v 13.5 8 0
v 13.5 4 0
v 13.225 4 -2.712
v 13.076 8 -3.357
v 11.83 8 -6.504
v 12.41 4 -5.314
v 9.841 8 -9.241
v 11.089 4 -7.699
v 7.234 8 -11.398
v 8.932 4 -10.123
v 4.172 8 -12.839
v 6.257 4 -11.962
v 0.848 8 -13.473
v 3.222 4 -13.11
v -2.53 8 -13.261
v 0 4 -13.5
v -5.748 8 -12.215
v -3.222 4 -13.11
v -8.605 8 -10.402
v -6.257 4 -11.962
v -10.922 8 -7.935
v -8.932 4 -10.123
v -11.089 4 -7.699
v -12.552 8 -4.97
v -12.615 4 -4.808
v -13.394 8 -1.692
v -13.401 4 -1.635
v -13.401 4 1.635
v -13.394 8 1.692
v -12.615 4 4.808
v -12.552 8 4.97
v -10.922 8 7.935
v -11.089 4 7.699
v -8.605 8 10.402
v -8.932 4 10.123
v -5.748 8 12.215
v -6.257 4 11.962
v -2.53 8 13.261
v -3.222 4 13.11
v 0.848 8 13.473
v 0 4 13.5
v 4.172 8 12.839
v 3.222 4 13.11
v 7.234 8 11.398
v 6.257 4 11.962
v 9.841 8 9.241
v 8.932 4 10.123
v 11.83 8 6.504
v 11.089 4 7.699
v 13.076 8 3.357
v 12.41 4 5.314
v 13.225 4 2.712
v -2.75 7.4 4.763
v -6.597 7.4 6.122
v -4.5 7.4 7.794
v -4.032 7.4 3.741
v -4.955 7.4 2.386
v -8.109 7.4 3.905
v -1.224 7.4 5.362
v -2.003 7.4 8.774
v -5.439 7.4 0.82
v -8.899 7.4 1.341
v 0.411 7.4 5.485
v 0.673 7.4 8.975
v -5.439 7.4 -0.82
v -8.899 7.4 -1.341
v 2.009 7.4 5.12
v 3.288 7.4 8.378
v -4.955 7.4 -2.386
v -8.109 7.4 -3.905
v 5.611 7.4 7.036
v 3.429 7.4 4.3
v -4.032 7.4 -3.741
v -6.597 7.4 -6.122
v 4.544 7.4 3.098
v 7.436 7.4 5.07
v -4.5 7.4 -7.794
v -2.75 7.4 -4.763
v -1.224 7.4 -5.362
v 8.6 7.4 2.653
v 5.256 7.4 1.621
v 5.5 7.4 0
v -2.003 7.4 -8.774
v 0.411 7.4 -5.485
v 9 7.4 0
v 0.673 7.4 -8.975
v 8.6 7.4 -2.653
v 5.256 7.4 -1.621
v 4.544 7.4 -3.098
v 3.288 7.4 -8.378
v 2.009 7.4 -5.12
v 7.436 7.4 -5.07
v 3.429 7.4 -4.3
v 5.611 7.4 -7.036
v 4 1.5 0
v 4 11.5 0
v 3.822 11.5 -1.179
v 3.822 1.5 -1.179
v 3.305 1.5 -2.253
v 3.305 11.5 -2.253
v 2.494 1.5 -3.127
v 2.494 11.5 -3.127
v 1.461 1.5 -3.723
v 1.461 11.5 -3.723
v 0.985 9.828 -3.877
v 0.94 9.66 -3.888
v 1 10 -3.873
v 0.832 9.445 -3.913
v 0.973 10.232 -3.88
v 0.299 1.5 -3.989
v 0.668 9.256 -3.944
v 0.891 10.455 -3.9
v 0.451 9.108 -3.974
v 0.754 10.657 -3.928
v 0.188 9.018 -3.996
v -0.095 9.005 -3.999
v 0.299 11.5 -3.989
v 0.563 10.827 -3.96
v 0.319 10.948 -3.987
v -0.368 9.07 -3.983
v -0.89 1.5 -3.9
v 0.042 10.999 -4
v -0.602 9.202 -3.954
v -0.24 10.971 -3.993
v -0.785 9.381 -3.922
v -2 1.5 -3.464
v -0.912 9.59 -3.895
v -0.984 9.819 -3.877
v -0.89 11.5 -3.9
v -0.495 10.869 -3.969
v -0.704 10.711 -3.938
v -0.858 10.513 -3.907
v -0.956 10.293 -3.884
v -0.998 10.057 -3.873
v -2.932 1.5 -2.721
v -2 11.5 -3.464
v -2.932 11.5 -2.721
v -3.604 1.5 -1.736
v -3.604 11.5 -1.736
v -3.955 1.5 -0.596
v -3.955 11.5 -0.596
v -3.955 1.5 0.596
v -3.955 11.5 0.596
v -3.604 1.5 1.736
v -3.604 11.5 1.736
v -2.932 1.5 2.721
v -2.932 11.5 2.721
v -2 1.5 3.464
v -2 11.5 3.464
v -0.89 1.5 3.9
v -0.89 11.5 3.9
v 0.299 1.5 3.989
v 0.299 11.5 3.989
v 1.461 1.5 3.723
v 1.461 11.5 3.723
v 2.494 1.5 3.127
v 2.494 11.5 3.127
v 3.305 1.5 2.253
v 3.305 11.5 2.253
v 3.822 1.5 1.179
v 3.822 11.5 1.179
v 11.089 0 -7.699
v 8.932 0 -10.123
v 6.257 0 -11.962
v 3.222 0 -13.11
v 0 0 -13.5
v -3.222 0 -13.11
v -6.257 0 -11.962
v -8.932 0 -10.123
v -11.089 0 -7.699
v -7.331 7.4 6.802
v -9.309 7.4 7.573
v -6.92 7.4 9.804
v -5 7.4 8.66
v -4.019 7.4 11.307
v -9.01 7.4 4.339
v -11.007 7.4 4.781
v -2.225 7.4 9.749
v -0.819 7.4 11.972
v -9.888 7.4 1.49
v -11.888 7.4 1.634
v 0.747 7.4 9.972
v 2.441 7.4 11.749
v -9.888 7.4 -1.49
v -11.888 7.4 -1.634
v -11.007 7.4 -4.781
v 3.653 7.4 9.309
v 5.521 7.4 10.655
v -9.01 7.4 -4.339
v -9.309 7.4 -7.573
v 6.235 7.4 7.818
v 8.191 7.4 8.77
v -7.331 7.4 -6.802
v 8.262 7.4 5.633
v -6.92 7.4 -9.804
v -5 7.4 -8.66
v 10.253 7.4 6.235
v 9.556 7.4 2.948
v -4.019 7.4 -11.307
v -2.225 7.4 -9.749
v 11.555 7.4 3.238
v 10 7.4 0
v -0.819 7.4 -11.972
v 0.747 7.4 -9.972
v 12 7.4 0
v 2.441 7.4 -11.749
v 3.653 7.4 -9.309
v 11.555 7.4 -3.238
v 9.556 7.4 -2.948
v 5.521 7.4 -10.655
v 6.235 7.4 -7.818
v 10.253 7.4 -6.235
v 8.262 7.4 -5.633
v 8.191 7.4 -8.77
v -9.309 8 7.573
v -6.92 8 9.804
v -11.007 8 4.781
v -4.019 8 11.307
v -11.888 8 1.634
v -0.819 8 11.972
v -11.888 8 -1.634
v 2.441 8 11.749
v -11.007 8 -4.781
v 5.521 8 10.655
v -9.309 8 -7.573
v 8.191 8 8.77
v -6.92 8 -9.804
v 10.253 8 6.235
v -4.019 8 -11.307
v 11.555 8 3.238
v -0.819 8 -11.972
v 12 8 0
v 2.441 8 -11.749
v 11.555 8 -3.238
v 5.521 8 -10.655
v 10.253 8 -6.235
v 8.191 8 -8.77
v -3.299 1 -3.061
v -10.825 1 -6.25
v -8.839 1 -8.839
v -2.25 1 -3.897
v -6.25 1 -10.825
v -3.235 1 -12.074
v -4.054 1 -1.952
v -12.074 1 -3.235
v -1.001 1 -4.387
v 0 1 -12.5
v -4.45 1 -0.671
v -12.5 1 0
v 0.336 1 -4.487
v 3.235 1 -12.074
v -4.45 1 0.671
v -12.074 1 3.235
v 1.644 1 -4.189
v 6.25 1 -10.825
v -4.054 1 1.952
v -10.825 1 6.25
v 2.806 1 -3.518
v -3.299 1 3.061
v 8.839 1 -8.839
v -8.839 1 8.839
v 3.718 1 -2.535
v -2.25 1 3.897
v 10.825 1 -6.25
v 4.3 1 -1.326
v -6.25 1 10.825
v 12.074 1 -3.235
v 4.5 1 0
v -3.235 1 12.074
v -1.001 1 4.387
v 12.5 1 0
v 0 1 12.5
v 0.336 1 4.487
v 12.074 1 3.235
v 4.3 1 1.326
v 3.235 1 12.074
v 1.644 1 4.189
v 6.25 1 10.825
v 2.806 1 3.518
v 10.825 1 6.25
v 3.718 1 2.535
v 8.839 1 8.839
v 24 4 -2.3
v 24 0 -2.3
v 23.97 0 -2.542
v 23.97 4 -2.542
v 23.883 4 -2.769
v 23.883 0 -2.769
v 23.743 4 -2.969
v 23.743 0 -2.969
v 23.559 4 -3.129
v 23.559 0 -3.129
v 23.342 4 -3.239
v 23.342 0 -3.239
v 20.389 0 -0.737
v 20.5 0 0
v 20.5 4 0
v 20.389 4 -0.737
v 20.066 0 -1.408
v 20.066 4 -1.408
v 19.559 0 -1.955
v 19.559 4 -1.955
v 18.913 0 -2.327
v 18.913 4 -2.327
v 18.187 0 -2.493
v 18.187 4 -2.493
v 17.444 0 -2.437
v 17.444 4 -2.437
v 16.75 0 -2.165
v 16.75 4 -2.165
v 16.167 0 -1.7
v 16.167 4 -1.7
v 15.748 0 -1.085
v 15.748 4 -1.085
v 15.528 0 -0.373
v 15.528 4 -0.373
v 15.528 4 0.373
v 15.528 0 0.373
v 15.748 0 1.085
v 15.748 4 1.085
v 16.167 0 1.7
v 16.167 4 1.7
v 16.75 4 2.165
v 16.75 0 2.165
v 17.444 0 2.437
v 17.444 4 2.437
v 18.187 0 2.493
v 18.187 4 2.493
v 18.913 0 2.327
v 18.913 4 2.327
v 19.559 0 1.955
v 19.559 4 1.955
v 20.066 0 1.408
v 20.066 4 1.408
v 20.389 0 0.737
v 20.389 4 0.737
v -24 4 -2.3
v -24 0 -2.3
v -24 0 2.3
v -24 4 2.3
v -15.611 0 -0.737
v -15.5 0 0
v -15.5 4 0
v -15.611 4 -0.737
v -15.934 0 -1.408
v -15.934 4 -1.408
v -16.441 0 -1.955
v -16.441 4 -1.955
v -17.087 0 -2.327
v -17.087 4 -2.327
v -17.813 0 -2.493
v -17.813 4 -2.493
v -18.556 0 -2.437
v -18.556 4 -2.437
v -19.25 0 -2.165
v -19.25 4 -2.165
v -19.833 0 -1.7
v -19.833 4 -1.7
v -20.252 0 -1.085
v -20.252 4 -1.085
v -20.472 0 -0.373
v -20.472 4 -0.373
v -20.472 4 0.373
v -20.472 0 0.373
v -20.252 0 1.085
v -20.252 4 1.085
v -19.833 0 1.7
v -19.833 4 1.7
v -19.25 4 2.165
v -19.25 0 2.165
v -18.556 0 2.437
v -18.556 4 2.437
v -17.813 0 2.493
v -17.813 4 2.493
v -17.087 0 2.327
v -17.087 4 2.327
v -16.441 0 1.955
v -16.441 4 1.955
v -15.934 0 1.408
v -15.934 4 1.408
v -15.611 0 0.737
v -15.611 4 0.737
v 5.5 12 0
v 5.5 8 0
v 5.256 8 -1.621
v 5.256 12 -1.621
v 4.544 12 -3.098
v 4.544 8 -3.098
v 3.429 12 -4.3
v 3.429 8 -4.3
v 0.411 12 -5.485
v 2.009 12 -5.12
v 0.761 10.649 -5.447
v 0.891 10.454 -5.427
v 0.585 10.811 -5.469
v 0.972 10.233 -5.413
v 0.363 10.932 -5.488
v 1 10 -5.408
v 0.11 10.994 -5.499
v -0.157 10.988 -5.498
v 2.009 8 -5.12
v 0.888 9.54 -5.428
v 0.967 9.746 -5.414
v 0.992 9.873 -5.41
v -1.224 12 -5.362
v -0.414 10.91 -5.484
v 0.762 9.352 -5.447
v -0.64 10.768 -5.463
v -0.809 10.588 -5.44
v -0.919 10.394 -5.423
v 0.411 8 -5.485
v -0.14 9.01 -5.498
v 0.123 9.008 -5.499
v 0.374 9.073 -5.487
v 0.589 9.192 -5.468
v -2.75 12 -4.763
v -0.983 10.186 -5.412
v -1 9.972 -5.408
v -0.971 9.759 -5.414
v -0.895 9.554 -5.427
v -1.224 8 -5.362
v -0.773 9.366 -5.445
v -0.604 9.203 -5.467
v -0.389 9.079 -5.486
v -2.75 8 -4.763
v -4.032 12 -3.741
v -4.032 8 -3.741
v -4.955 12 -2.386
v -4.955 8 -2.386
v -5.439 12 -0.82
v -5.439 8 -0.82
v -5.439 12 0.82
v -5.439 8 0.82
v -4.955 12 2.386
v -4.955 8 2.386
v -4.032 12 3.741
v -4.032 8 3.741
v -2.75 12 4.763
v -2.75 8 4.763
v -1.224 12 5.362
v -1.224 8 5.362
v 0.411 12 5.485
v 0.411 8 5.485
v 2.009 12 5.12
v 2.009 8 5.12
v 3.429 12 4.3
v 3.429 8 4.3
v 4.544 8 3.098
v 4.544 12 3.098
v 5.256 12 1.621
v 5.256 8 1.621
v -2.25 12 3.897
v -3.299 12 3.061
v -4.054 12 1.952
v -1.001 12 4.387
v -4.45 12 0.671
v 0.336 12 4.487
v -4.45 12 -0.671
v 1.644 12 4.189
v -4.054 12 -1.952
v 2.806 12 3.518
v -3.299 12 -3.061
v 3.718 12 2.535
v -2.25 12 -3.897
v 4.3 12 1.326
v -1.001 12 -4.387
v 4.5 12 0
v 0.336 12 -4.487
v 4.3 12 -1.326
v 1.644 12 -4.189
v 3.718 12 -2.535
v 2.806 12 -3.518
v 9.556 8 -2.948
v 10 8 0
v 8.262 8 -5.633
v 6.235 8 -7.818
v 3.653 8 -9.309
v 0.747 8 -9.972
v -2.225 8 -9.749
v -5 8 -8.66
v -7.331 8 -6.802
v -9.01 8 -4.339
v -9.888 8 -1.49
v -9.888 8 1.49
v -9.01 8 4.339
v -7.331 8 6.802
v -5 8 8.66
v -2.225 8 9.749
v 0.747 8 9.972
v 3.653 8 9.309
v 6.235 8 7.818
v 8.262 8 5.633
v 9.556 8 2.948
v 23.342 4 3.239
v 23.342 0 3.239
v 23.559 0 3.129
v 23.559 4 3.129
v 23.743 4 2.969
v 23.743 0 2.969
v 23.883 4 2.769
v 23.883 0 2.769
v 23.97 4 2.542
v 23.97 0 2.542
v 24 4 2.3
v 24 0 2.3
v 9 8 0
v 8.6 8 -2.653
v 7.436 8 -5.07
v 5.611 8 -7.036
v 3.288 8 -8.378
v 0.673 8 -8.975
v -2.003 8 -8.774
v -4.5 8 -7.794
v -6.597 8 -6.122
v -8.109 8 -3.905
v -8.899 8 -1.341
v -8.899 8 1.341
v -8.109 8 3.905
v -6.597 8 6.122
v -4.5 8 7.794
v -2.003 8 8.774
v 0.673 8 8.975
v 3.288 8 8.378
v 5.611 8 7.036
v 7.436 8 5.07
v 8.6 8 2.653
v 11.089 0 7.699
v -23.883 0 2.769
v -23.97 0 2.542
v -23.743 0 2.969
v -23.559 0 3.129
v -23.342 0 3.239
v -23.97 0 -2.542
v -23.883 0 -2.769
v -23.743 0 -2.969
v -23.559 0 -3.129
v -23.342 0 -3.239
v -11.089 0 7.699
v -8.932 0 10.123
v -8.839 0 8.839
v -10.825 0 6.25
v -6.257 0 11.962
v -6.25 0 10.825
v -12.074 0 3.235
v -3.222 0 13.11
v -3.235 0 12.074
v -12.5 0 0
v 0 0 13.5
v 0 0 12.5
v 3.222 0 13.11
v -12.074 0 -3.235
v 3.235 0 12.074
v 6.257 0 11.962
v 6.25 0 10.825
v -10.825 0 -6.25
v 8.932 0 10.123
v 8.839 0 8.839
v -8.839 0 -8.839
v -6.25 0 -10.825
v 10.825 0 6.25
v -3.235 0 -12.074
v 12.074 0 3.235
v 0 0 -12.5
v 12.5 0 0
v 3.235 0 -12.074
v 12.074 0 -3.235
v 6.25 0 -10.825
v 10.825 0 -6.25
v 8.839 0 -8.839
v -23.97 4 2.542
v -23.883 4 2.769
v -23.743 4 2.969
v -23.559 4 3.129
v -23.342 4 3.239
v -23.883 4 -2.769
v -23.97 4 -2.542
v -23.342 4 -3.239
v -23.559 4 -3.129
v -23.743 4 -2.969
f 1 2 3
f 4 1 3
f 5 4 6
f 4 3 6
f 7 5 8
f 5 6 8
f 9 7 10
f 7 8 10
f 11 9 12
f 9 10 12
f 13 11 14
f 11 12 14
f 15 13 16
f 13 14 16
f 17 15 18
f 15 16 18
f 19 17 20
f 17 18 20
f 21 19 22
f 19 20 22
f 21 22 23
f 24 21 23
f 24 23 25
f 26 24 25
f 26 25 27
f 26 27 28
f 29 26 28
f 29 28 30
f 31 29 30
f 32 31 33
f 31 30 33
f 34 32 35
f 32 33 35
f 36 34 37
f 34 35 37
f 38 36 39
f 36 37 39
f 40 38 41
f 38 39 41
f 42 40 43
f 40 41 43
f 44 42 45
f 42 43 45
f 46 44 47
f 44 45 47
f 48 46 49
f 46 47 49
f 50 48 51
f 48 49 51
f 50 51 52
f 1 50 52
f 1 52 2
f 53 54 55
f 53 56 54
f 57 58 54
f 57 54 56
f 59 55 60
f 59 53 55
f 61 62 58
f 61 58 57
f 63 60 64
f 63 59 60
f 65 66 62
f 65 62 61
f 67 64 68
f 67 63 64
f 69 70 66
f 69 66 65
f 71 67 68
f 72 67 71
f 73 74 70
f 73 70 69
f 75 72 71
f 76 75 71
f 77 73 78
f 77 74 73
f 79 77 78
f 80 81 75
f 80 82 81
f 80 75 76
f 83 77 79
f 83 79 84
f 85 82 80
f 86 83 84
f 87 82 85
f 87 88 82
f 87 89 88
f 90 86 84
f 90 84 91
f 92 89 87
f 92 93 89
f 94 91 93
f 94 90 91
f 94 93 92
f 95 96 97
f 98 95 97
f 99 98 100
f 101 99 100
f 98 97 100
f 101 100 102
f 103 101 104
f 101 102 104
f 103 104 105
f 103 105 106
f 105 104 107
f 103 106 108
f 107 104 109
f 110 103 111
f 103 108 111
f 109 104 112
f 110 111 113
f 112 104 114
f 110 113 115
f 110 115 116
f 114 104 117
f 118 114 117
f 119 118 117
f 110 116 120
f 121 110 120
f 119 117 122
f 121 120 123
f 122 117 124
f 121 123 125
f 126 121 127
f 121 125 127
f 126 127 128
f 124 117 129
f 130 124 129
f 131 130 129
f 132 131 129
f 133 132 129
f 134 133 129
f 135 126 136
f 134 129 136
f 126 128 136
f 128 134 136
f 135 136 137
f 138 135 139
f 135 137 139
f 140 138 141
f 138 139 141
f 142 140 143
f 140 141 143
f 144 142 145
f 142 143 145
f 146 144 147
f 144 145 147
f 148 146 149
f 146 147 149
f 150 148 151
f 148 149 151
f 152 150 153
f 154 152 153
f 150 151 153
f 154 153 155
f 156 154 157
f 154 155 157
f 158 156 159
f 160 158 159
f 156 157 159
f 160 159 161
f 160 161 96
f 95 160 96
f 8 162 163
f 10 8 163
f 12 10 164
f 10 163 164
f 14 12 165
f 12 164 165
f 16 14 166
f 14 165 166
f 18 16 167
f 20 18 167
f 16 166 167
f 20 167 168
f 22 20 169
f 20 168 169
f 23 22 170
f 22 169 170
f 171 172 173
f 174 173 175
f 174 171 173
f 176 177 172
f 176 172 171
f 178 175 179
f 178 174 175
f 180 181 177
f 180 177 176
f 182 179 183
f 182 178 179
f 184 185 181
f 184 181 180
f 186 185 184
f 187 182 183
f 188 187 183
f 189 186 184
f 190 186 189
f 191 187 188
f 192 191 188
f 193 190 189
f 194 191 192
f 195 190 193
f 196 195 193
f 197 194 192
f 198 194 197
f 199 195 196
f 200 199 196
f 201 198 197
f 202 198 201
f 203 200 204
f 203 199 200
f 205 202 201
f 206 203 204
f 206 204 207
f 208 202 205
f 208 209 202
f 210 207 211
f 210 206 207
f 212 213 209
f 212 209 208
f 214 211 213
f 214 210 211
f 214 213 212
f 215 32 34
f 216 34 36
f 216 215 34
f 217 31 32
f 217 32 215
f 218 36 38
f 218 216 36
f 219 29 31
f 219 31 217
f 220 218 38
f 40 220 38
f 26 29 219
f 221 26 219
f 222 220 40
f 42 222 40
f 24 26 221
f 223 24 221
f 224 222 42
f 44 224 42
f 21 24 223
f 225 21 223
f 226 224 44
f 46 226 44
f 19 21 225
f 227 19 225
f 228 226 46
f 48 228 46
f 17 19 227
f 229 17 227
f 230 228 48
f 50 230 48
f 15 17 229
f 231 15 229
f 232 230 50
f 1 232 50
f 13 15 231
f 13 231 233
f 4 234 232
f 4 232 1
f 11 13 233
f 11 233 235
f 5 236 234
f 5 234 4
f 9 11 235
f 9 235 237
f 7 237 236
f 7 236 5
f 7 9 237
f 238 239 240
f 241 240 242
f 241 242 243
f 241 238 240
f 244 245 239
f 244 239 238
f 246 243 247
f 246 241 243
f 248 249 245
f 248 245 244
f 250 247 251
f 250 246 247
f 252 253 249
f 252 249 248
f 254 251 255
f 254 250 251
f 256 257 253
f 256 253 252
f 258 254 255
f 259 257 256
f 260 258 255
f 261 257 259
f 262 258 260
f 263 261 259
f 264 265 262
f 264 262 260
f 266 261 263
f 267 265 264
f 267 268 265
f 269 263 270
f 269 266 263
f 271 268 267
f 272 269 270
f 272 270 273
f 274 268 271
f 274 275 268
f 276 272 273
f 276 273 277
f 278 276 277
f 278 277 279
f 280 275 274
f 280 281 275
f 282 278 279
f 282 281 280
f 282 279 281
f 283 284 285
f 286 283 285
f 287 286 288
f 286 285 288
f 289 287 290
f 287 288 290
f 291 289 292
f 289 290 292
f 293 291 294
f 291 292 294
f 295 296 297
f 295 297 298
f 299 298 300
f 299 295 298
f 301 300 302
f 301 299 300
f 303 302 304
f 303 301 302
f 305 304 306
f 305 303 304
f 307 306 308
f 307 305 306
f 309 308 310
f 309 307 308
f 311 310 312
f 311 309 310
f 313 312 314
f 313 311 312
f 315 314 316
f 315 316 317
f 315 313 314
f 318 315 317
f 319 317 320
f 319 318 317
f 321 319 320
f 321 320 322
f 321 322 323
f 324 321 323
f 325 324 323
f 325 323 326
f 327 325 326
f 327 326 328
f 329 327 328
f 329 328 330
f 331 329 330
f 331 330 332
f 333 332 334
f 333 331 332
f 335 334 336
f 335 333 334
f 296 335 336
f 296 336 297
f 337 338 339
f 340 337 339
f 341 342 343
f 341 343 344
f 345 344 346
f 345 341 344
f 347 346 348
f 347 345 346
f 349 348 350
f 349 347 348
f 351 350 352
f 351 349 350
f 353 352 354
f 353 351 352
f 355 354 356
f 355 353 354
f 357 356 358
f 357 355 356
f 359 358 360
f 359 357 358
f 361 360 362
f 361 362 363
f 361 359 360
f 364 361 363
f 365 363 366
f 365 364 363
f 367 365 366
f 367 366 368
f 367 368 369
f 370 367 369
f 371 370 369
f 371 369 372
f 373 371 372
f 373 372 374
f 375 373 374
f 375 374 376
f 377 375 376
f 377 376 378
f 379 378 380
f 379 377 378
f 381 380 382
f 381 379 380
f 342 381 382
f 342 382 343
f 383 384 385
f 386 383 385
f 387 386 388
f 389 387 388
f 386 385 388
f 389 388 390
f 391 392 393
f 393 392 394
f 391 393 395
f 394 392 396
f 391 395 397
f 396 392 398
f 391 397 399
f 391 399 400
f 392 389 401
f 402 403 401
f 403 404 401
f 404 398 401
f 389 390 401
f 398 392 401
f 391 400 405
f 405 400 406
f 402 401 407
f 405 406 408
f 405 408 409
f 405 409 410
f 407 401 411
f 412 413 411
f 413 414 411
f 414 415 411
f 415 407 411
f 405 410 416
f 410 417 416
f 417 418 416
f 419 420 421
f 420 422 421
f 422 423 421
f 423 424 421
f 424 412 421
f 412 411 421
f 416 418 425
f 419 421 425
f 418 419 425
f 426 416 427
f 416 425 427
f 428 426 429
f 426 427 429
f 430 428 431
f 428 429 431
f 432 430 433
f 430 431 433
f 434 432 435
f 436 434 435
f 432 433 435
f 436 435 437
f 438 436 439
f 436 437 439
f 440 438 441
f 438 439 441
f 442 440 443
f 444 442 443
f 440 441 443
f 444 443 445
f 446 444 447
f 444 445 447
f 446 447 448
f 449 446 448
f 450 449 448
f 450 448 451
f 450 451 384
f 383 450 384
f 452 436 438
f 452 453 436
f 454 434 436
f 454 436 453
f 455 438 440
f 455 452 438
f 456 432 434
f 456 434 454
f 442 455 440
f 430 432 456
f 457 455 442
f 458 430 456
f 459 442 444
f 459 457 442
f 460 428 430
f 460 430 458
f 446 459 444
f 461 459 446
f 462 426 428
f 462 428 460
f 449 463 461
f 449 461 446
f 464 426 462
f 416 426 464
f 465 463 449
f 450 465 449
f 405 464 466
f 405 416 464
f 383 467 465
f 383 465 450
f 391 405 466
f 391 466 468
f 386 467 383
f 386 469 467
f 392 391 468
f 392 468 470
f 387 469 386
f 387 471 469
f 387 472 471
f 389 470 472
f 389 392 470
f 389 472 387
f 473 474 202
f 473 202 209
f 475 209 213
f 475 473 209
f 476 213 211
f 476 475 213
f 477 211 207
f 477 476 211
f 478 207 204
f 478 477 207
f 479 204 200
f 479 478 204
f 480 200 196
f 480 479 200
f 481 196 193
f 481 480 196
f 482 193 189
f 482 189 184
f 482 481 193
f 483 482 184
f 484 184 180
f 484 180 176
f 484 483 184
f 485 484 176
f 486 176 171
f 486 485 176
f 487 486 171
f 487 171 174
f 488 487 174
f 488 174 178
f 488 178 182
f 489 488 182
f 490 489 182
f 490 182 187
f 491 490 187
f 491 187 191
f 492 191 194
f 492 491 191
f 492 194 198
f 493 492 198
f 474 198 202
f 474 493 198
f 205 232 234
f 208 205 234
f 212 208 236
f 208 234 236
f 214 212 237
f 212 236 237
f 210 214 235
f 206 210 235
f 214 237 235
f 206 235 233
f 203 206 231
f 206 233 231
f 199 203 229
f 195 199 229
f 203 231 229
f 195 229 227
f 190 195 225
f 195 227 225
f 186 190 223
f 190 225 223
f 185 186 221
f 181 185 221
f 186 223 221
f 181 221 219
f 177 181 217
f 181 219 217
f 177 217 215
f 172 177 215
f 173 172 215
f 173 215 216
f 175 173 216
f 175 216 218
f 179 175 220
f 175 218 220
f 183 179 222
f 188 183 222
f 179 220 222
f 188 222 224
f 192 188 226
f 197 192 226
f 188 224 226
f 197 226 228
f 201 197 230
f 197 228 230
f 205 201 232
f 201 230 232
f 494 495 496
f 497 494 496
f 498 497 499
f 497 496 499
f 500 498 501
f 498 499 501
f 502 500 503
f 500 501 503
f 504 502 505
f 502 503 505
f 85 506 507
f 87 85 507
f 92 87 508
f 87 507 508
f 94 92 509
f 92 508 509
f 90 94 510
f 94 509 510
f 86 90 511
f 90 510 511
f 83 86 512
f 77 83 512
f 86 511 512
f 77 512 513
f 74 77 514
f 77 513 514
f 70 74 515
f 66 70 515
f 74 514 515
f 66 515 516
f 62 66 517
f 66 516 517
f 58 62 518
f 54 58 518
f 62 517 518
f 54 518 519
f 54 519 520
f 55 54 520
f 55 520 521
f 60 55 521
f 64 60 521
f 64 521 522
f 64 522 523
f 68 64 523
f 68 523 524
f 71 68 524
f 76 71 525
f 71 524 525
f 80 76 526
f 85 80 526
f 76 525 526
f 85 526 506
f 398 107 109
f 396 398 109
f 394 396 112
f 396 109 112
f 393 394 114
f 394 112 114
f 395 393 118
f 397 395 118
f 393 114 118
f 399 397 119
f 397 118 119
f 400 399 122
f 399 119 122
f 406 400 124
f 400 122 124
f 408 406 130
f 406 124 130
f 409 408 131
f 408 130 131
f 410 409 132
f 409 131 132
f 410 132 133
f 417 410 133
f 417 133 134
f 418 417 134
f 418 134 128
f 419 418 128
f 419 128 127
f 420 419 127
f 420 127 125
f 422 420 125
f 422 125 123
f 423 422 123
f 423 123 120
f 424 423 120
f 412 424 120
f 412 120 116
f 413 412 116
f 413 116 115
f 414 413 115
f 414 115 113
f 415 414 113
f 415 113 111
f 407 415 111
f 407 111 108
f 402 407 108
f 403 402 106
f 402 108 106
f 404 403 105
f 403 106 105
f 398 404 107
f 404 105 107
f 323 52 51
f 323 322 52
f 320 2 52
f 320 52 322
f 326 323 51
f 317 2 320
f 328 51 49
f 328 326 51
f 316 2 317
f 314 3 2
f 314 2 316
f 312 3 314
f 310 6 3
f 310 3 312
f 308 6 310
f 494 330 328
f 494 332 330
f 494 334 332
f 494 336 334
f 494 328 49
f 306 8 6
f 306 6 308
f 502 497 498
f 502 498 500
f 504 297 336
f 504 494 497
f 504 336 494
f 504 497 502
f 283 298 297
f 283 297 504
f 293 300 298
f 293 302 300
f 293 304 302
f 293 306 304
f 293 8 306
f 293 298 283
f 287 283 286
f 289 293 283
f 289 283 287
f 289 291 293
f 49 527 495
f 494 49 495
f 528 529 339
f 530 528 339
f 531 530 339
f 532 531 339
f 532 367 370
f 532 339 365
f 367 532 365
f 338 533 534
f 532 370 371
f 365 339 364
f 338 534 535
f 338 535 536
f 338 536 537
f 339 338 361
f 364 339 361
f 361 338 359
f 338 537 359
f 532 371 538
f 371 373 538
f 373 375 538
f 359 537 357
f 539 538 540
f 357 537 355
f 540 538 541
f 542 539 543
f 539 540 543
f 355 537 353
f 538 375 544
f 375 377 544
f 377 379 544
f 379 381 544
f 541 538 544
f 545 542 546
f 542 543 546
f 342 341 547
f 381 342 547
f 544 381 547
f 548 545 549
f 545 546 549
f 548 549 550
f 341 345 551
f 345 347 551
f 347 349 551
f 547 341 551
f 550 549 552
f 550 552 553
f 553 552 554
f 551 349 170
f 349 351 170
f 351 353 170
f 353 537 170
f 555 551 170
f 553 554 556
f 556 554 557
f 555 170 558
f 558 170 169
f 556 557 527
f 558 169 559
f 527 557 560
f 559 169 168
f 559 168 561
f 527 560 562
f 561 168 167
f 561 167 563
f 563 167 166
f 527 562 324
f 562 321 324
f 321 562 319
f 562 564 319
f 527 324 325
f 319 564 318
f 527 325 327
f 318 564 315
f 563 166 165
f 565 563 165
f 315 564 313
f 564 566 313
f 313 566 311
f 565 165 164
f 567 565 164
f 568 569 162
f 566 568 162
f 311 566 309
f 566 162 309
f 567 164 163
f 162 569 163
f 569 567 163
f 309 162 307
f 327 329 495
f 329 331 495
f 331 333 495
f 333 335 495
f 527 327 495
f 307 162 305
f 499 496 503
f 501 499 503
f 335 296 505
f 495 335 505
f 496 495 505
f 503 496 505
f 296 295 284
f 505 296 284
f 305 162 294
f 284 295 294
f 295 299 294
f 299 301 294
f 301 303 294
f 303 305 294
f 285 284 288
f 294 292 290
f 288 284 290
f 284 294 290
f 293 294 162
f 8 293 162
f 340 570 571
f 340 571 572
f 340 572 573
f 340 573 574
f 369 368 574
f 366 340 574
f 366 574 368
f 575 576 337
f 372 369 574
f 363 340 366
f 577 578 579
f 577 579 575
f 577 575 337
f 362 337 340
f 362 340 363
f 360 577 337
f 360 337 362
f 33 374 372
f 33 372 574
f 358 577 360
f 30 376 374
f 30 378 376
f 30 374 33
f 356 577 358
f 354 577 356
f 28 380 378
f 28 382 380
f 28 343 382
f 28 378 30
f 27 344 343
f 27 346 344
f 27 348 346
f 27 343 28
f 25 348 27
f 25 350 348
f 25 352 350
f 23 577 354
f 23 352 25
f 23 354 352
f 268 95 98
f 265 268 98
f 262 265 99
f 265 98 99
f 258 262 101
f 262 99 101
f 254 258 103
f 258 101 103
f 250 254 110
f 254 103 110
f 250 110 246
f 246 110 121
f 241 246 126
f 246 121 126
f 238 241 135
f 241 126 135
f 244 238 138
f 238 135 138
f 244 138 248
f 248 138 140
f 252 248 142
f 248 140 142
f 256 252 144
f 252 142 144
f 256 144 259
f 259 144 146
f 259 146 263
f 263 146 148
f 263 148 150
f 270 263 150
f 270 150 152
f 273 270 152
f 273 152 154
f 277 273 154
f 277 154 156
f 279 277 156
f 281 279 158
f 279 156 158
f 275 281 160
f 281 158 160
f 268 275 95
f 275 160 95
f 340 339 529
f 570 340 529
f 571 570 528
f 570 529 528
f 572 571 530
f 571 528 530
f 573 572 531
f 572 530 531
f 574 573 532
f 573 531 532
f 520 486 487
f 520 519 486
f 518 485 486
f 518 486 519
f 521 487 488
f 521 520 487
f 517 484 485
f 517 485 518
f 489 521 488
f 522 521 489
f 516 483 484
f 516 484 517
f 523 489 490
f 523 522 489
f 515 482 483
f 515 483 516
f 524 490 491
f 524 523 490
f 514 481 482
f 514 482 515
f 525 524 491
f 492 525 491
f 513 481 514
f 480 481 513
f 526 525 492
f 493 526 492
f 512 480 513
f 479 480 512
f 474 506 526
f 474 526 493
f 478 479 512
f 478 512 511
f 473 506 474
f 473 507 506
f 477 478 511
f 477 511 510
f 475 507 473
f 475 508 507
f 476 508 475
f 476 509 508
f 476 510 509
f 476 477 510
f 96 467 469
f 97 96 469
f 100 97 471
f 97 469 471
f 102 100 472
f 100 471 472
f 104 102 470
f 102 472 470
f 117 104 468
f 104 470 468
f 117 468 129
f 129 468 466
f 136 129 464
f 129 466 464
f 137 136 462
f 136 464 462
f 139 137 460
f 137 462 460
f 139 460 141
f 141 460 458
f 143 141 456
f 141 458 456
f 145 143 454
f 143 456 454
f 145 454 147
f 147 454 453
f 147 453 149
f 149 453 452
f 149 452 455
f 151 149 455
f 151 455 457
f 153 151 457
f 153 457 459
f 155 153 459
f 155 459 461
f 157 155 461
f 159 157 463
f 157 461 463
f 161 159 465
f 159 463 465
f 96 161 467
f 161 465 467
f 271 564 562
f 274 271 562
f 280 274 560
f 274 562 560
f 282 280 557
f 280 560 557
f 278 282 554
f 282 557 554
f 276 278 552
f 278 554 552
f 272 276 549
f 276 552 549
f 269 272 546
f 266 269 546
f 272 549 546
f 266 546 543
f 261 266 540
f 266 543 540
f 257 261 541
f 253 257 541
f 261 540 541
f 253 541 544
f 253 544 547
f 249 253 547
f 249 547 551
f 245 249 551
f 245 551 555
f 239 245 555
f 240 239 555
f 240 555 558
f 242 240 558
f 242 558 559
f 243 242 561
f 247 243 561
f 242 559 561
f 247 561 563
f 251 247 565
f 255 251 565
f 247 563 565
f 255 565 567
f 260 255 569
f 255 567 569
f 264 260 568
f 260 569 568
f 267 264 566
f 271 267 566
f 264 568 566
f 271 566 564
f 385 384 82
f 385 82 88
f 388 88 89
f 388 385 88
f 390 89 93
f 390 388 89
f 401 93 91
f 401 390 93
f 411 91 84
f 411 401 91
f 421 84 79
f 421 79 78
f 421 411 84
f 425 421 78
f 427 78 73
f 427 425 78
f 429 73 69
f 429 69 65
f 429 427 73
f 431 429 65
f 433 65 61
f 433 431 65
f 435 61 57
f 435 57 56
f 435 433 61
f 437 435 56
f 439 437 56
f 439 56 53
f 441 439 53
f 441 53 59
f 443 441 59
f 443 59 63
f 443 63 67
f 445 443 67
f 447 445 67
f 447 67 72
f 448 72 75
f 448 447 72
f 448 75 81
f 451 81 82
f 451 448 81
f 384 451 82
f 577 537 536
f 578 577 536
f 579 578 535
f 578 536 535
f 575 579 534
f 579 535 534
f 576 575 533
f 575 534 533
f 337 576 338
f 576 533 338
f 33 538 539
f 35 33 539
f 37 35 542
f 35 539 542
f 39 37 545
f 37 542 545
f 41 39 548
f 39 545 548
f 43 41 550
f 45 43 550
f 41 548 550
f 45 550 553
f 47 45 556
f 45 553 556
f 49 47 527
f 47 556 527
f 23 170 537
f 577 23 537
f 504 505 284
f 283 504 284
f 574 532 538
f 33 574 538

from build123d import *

# Parameters (mm, degrees)
SKETCH_1_R          = 2.5
EXTRUDE_1_DEPTH     = 4
SKETCH_2_R          = 13.5
EXTRUDE_2_DEPTH     = 4
SKETCH_3_R          = 5.5
EXTRUDE_3_DEPTH     = 4
SKETCH_4_R          = 4
CUT_EXTRUDE_1_DEPTH = 13
SKETCH_5_R          = 12
SKETCH_5_R_2        = 10
SKETCH_5_R_3        = 9
SKETCH_5_R_4        = 5.5
CUT_EXTRUDE_2_DEPTH = 0.6
SKETCH_8_R          = 12.5
CUT_EXTRUDE_4_DEPTH = 1
SKETCH_9_R          = 1
CUT_EXTRUDE_5_DEPTH = 14.5
CHAMFER_1_SIZE      = 0.5


with BuildPart() as part:
    # 草图1 → 凸台-拉伸1 (new body)
    with BuildSketch(Plane(origin=(0, 0, 0), x_dir=(1, 0, 0), z_dir=(0, 1, 0))):
        with BuildLine():
            Line((24, -2.299792462), (24, 2.299792462))
            ThreePointArc((24, 2.299792462), (23.819152044, 2.873368898), (23.342020143, 3.239485083))
            Line((23.342020143, 3.239485083), (11.089367754, 7.699085843))
            ThreePointArc((11.089367754, 7.699085843), (0, 13.5), (-11.089367754, 7.699085843))
            Line((-11.089367754, 7.699085843), (-23.342020143, 3.239485083))
            ThreePointArc((-23.342020143, 3.239485083), (-23.819152044, 2.873368898), (-24, 2.299792462))
            Line((-24, 2.299792462), (-24, -2.299792462))
            ThreePointArc((-24, -2.299792462), (-23.819152044, -2.873368898), (-23.342020143, -3.239485083))
            Line((-23.342020143, -3.239485083), (-11.089367754, -7.699085843))
            ThreePointArc((-11.089367754, -7.699085843), (0, -13.5), (11.089367754, -7.699085843))
            Line((11.089367754, -7.699085843), (23.342020143, -3.239485083))
            ThreePointArc((23.342020143, -3.239485083), (23.819152044, -2.873368898), (24, -2.299792462))
        make_face()
        with Locations((-18, 0)):
            Circle(SKETCH_1_R, mode=Mode.SUBTRACT)
        with Locations((18, 0)):
            Circle(SKETCH_1_R, mode=Mode.SUBTRACT)
    extrude(amount=EXTRUDE_1_DEPTH)

    # 草图2 → 凸台-拉伸2 (add)
    with BuildSketch(Plane(origin=(0, 4, 0), x_dir=(1, 0, 0), z_dir=(0, 1, 0))):
        Circle(SKETCH_2_R)
    extrude(amount=EXTRUDE_2_DEPTH)

    # 草图3 → 凸台-拉伸3 (add)
    with BuildSketch(Plane(origin=(0, 8, 0), x_dir=(1, 0, 0), z_dir=(0, 1, 0))):
        Circle(SKETCH_3_R)
    extrude(amount=EXTRUDE_3_DEPTH)

    # 草图4 → 切除-拉伸1 (cut, through all)
    with BuildSketch(Plane(origin=(0, 12, 0), x_dir=(1, 0, 0), z_dir=(0, 1, 0))):
        Circle(SKETCH_4_R)
    extrude(amount=-CUT_EXTRUDE_1_DEPTH, mode=Mode.SUBTRACT)

    # 草图5 → 切除-拉伸2 (cut)
    with BuildSketch(Plane(origin=(0, 8, 0), x_dir=(1, 0, 0), z_dir=(0, 1, 0))):
        Circle(SKETCH_5_R)
        Circle(SKETCH_5_R_2, mode=Mode.SUBTRACT)
        Circle(SKETCH_5_R_3)
        Circle(SKETCH_5_R_4, mode=Mode.SUBTRACT)
    extrude(amount=-CUT_EXTRUDE_2_DEPTH, mode=Mode.SUBTRACT)

    # 草图8 → 切除-拉伸4 (cut)
    with BuildSketch(Plane.XZ):
        Circle(SKETCH_8_R)
    extrude(amount=-CUT_EXTRUDE_4_DEPTH, mode=Mode.SUBTRACT)

    # 草图9 → 切除-拉伸5 (cut, through all)
    with BuildSketch(Plane.XY):
        with Locations((0, 10)):
            Circle(SKETCH_9_R)
    extrude(amount=-CUT_EXTRUDE_5_DEPTH, mode=Mode.SUBTRACT)

    # 倒角1
    chamfer_1_edges = [part.edges().sort_by_distance(p)[0] for p in [
        (-4, 12, 0),
        (-4, 1, 0),
    ]]
    chamfer(chamfer_1_edges, length=CHAMFER_1_SIZE)


solid = part.part
